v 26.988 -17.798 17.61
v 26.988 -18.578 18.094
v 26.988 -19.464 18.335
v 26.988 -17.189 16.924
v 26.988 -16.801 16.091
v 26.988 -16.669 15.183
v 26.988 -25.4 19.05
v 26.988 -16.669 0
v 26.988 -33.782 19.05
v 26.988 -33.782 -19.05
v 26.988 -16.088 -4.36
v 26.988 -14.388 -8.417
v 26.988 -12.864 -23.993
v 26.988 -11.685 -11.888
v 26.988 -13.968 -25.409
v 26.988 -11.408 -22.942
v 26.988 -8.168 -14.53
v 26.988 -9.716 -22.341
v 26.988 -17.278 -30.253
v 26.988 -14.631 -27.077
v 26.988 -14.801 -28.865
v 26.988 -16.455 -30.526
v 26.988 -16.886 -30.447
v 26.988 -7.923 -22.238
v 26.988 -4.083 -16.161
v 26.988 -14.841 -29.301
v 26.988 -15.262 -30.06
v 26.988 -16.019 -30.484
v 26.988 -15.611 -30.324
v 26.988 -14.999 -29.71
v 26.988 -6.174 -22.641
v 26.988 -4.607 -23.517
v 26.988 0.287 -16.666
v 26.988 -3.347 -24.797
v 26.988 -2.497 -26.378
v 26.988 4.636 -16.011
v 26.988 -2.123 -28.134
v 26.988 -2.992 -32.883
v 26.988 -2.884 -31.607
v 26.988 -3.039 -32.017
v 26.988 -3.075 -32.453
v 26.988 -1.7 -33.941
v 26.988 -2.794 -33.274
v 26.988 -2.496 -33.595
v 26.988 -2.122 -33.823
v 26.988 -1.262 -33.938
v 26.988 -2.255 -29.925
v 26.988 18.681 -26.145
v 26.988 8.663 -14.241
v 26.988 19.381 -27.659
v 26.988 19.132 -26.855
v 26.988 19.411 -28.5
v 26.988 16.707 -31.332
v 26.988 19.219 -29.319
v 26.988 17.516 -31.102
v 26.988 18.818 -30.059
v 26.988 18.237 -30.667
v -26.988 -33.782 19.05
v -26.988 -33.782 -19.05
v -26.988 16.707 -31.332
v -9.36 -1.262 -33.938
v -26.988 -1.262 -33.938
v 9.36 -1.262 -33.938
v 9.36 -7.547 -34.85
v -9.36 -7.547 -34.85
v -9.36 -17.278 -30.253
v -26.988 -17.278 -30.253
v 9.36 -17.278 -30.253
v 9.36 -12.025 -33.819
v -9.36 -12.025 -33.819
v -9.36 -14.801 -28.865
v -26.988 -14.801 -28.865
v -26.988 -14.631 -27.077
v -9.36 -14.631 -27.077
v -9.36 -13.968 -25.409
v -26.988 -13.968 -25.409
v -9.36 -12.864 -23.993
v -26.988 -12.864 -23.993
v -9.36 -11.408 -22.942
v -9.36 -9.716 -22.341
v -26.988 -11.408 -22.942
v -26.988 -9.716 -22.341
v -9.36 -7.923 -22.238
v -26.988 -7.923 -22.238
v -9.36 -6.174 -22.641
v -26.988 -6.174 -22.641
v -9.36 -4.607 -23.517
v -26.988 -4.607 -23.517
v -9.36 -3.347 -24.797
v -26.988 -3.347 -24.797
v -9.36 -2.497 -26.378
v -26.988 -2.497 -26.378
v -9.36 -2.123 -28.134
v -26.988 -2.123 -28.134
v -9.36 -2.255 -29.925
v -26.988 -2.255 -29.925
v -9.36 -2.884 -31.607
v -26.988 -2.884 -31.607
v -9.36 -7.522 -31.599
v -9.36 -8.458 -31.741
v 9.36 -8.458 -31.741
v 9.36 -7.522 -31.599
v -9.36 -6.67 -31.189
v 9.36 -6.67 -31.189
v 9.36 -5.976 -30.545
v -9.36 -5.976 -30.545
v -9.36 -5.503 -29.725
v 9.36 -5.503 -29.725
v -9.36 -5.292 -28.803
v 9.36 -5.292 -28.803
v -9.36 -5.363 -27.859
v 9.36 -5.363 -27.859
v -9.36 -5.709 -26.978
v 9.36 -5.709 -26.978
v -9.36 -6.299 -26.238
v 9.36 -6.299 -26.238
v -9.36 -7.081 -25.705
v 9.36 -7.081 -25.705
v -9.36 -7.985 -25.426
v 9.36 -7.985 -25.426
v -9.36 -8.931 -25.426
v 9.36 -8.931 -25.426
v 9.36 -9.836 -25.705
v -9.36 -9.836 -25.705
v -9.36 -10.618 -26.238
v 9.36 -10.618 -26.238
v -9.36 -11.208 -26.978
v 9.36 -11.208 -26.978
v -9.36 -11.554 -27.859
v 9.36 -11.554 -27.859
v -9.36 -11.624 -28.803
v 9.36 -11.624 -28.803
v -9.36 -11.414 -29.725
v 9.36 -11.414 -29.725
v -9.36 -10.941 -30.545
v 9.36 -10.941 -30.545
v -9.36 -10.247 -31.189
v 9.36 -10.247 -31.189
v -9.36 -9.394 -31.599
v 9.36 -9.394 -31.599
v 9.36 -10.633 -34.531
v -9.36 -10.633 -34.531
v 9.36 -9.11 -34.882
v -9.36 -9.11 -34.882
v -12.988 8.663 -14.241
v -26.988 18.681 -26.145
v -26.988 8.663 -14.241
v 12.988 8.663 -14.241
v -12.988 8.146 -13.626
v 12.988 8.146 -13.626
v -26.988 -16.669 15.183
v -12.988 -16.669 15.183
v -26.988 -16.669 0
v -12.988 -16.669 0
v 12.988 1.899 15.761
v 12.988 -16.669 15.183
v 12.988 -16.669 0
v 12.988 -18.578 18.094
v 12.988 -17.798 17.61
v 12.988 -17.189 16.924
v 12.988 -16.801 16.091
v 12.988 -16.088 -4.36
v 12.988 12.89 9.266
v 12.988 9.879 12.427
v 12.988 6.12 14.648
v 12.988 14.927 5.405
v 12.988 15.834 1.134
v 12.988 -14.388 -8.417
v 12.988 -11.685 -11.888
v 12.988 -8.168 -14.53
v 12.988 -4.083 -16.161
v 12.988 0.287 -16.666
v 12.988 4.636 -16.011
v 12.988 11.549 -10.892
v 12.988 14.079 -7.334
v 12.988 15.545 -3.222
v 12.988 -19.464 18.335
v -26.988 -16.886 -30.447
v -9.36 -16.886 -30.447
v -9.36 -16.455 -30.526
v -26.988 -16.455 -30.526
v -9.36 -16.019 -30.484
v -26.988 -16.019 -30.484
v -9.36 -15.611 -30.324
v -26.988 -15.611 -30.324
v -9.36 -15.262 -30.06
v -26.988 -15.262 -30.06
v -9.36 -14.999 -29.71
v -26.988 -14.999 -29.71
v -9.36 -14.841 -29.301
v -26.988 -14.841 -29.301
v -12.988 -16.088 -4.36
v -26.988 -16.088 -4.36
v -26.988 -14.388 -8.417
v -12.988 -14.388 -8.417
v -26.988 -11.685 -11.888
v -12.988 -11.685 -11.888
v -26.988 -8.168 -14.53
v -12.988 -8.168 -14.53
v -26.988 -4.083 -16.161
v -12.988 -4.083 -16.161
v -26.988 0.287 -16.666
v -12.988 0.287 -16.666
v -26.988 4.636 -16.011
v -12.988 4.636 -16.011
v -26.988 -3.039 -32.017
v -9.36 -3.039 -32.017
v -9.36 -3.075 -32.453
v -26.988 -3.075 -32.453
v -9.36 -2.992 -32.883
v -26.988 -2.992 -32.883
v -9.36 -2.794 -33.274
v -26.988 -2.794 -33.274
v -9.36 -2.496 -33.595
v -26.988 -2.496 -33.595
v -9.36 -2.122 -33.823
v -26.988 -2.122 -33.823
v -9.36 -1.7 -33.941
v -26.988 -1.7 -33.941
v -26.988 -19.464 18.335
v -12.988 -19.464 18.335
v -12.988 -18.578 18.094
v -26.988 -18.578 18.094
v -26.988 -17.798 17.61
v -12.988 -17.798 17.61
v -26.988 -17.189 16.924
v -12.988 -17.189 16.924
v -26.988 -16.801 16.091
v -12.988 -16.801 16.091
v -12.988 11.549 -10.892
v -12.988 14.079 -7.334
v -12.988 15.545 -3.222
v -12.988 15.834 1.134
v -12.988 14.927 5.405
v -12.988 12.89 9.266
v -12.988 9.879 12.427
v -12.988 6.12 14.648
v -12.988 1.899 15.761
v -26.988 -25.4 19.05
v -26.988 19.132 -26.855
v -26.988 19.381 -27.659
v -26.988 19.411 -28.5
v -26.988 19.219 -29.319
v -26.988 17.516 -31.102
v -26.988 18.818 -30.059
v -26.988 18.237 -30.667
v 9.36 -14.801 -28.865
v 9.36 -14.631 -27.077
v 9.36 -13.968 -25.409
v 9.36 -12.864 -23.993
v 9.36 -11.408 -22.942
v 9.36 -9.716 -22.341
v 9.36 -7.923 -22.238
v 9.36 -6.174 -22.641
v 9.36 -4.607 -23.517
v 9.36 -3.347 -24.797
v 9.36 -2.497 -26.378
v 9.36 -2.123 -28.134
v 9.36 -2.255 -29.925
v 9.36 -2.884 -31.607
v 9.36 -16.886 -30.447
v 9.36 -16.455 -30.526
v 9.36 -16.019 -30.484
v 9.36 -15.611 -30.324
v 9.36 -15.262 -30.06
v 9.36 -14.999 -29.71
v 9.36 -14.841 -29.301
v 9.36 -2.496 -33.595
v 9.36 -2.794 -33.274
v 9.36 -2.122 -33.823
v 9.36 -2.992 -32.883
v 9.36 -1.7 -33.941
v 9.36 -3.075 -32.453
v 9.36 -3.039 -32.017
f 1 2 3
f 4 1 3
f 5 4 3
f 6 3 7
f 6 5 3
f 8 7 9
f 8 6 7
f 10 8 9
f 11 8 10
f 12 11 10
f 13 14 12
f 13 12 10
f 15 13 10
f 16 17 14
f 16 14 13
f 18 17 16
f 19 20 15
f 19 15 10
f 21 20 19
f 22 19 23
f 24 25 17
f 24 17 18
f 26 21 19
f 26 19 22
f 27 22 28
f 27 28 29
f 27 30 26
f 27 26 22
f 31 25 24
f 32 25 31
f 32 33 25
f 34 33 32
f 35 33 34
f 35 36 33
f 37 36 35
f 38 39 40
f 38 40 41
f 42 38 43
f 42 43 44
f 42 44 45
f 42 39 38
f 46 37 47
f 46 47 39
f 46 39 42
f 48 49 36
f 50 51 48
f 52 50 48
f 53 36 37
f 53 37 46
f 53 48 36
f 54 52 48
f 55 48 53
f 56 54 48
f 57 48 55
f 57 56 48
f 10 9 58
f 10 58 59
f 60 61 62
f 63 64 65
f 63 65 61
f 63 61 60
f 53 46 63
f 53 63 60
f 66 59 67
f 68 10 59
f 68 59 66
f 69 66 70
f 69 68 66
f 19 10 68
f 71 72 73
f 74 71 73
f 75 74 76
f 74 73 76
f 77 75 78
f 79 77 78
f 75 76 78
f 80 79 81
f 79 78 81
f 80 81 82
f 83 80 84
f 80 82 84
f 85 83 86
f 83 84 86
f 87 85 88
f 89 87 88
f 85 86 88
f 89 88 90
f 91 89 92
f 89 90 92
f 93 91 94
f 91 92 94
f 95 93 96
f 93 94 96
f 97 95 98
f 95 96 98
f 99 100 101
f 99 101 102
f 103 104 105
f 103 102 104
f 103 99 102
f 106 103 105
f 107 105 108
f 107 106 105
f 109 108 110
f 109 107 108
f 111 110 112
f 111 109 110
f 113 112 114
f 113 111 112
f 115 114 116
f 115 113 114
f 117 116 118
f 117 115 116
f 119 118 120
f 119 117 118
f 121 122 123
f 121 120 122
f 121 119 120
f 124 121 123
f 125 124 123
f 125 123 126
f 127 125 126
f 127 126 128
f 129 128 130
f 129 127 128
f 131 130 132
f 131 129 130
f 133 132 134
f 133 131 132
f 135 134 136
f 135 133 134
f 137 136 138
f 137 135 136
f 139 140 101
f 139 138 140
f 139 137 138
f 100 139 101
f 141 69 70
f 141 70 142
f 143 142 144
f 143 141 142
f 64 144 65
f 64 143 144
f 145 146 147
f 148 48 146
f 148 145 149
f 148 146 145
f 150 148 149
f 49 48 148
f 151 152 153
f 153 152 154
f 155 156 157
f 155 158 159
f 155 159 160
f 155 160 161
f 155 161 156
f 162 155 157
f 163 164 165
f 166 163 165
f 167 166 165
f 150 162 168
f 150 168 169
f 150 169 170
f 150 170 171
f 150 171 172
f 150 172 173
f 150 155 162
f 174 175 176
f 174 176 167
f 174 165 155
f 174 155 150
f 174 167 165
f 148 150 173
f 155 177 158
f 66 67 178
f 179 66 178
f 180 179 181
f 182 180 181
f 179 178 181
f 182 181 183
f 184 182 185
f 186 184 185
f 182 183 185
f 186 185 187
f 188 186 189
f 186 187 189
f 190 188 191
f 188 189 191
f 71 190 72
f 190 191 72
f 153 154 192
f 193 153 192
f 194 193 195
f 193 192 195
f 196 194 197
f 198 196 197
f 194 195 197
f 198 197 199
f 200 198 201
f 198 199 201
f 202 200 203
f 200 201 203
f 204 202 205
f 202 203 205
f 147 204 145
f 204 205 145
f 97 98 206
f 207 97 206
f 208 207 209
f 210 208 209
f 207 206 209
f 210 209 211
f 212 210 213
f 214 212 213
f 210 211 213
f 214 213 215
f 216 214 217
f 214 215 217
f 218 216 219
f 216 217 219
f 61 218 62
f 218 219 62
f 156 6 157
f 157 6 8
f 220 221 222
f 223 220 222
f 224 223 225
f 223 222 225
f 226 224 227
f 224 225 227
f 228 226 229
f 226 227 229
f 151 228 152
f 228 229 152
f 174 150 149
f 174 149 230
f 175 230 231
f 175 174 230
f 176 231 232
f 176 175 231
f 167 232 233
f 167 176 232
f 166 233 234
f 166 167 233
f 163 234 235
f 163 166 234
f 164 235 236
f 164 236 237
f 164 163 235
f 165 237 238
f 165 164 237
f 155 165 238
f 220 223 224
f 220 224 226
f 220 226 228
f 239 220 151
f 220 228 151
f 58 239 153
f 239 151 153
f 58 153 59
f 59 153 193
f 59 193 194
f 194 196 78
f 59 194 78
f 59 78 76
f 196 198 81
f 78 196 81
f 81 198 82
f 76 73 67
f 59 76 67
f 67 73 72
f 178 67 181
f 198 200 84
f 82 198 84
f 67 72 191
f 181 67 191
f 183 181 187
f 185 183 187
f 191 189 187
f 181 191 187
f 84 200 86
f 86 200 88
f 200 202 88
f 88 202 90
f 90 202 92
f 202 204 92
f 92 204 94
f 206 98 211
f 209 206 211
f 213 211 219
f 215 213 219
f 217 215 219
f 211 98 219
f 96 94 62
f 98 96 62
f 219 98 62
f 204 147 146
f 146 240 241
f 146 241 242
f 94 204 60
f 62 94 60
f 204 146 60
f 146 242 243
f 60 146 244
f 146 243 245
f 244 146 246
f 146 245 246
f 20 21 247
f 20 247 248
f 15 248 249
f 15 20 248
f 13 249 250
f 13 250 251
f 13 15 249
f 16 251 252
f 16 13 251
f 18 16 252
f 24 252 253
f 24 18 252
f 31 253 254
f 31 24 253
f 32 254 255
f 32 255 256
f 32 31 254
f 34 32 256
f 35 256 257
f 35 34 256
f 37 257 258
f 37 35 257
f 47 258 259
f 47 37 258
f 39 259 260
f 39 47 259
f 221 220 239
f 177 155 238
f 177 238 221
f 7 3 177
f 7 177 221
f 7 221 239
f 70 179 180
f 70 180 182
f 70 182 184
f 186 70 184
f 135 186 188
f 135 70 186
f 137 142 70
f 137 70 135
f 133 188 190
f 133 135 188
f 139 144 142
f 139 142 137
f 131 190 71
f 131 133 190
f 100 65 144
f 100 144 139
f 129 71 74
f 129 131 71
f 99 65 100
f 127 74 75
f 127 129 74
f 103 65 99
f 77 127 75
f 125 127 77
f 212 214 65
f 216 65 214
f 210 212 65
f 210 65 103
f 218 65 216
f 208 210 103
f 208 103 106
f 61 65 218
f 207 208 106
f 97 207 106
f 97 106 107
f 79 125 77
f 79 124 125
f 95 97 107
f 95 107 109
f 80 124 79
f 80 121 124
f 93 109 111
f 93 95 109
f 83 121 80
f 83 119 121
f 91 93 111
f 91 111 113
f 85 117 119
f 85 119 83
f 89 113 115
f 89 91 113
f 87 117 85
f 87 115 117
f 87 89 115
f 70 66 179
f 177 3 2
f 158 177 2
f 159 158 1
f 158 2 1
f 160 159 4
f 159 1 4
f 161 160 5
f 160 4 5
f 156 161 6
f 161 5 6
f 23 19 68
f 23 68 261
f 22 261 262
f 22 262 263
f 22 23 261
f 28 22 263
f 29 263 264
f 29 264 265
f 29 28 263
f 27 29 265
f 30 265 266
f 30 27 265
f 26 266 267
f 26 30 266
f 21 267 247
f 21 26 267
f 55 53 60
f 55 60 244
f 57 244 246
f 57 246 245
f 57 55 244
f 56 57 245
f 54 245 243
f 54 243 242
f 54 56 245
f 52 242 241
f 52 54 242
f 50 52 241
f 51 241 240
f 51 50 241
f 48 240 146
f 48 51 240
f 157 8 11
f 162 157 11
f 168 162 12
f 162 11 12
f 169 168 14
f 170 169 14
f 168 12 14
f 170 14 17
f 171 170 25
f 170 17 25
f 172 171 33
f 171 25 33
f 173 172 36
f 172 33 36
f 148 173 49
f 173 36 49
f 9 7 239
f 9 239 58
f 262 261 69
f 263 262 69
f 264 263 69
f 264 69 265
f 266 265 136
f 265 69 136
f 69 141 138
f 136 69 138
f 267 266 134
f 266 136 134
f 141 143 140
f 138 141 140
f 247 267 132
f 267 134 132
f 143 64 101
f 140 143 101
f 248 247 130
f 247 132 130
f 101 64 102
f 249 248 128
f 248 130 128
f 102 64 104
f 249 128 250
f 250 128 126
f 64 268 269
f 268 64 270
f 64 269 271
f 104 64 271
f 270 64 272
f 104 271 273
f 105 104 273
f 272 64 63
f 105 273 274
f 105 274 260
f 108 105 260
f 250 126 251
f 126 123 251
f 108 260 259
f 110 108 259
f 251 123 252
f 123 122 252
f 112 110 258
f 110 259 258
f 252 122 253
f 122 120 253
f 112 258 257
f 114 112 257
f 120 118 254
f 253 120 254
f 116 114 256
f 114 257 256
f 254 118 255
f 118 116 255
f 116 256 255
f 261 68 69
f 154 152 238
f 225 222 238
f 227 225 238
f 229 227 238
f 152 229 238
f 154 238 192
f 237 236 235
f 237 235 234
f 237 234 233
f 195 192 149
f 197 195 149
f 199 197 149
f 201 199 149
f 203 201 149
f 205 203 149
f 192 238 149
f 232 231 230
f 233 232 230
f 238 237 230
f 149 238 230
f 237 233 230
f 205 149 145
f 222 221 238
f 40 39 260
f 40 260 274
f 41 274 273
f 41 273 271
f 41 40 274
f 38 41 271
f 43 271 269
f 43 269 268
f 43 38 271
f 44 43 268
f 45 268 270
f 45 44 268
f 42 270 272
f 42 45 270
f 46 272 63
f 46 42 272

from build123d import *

# Parameters (mm, degrees)
BOSS_EXTRUDE1_DEPTH = 26.9875
SKETCH2_R           = 3.175
BOSS_EXTRUDE2_DEPTH = 26.9875
CUT_EXTRUDE1_DEPTH  = 14
CUT_EXTRUDE2_START  = -39.975
CUT_EXTRUDE2_DEPTH  = 14
CUT_EXTRUDE3_DEPTH  = 17.6276
CUT_EXTRUDE4_START  = -53.975
CUT_EXTRUDE4_DEPTH  = 17.6276


with BuildPart() as part:
    # Sketch1 → Boss-Extrude1 (new, symmetric)
    with BuildSketch(Plane(origin=(0, 0, 0), x_dir=(0, 0, -1), z_dir=(1, 0, 0))):
        with BuildLine():
            Line((-15.761022628, 1.898891971), (-19.05, -25.4))
            Line((-19.05, -25.4), (-19.05, -33.782))
            Line((-19.05, -33.782), (19.05, -33.782))
            Line((19.05, -33.782), (19.05, -25.4))
            Line((19.05, -25.4), (15.761022628, 1.898891971))
            ThreePointArc((15.761022628, 1.898891971), (0, 15.875), (-15.761022628, 1.898891971))
        make_face()
    extrude(amount=BOSS_EXTRUDE1_DEPTH, both=True)

    # Sketch2 → Boss-Extrude2 (add, symmetric)
    with BuildSketch(Plane(origin=(0, 0, 0), x_dir=(0, 0, -1), z_dir=(1, 0, 0))):
        with BuildLine():
            Line((34.849752976, -7.546656143), (31.331707433, 16.706942484))
            ThreePointArc((31.331707433, 16.706942484), (29.318806596, 19.218576271), (26.145386515, 18.680543695))
            Line((26.145386515, 18.680543695), (13.625741227, 8.145845629))
            ThreePointArc((13.625741227, 8.145845629), (15.021703631, 5.134592976), (15.761022628, 1.898891971))
            Line((15.761022628, 1.898891971), (19.05, -25.4))
            Line((19.05, -25.4), (19.05, -33.782))
            Line((19.05, -33.782), (33.819378976, -12.024635583))
            ThreePointArc((33.819378976, -12.024635583), (34.753812672, -9.882113678), (34.849752976, -7.546656143))
        make_face()
        with Locations((28.565519705, -8.4582)):
            Circle(SKETCH2_R, mode=Mode.SUBTRACT)
    extrude(amount=BOSS_EXTRUDE2_DEPTH, both=True)

    # Sketch3 → Cut-Extrude1 (cut)
    with BuildSketch(Plane(origin=(26.9875, 0, 0), x_dir=(0, 0, -1), z_dir=(1, 0, 0))):
        with BuildLine():
            Line((-15.18262128, -16.66875), (0, -16.66875))
            ThreePointArc((0, -16.66875), (14.530186835, -8.168286057), (14.240626625, 8.663243036))
            Line((14.240626625, 8.663243036), (13.625741227, 8.145845629))
            ThreePointArc((13.625741227, 8.145845629), (-3.300903538, 15.528028234), (-15.761022628, 1.898891971))
            Line((-15.761022628, 1.898891971), (-18.334825806, -19.463971606))
            ThreePointArc((-18.334825806, -19.463971606), (-17.289138382, -17.468205704), (-15.18262128, -16.66875))
        make_face()
    extrude(amount=-CUT_EXTRUDE1_DEPTH, mode=Mode.SUBTRACT)

    # Sketch3<3> → Cut-Extrude2 (cut)
    with BuildSketch(Plane(origin=(26.9875, 0, 0), x_dir=(0, 0, -1), z_dir=(1, 0, 0)).offset(CUT_EXTRUDE2_START)):
        with BuildLine():
            Line((-15.18262128, -16.66875), (0, -16.66875))
            ThreePointArc((0, -16.66875), (14.530186835, -8.168286057), (14.240626625, 8.663243036))
            Line((14.240626625, 8.663243036), (13.625741227, 8.145845629))
            ThreePointArc((13.625741227, 8.145845629), (-3.300903538, 15.528028234), (-15.761022628, 1.898891971))
            Line((-15.761022628, 1.898891971), (-18.334825806, -19.463971606))
            ThreePointArc((-18.334825806, -19.463971606), (-17.289138382, -17.468205704), (-15.18262128, -16.66875))
        make_face()
    extrude(amount=-CUT_EXTRUDE2_DEPTH, mode=Mode.SUBTRACT)

    # Sketch4 → Cut-Extrude3 (cut)
    with BuildSketch(Plane(origin=(26.9875, 0, 0), x_dir=(0, 0, -1), z_dir=(1, 0, 0))):
        with BuildLine():
            Line((33.819378976, -12.024635583), (30.252943393, -17.278494853))
            ThreePointArc((30.252943393, -17.278494853), (30.324357139, -15.61082693), (28.864686801, -14.801148766))
            ThreePointArc((28.864686801, -14.801148766), (22.377226739, -7.034286322), (31.606824582, -2.883887069))
            ThreePointArc((31.606824582, -2.883887069), (33.273576843, -2.793592413), (33.938209118, -1.262422872))
            Line((33.938209118, -1.262422872), (34.849752976, -7.546656143))
            ThreePointArc((34.849752976, -7.546656143), (34.753812672, -9.882113678), (33.819378976, -12.024635583))
        make_face()
    extrude(amount=-CUT_EXTRUDE3_DEPTH, mode=Mode.SUBTRACT)

    # Sketch5<3> → Cut-Extrude4 (cut)
    with BuildSketch(Plane(origin=(26.9875, 0, 0), x_dir=(0, 0, -1), z_dir=(1, 0, 0)).offset(CUT_EXTRUDE4_START)):
        with BuildLine():
            Line((33.819378976, -12.024635583), (30.252943393, -17.278494853))
            ThreePointArc((30.252943393, -17.278494853), (30.324357139, -15.61082693), (28.864686801, -14.801148766))
            ThreePointArc((28.864686801, -14.801148766), (22.377226739, -7.034286322), (31.606824582, -2.883887069))
            ThreePointArc((31.606824582, -2.883887069), (33.273576843, -2.793592413), (33.938209118, -1.262422872))
            Line((33.938209118, -1.262422872), (34.849752976, -7.546656143))
            ThreePointArc((34.849752976, -7.546656143), (34.753812672, -9.882113678), (33.819378976, -12.024635583))
        make_face()
    extrude(amount=CUT_EXTRUDE4_DEPTH, mode=Mode.SUBTRACT)


solid = part.part
